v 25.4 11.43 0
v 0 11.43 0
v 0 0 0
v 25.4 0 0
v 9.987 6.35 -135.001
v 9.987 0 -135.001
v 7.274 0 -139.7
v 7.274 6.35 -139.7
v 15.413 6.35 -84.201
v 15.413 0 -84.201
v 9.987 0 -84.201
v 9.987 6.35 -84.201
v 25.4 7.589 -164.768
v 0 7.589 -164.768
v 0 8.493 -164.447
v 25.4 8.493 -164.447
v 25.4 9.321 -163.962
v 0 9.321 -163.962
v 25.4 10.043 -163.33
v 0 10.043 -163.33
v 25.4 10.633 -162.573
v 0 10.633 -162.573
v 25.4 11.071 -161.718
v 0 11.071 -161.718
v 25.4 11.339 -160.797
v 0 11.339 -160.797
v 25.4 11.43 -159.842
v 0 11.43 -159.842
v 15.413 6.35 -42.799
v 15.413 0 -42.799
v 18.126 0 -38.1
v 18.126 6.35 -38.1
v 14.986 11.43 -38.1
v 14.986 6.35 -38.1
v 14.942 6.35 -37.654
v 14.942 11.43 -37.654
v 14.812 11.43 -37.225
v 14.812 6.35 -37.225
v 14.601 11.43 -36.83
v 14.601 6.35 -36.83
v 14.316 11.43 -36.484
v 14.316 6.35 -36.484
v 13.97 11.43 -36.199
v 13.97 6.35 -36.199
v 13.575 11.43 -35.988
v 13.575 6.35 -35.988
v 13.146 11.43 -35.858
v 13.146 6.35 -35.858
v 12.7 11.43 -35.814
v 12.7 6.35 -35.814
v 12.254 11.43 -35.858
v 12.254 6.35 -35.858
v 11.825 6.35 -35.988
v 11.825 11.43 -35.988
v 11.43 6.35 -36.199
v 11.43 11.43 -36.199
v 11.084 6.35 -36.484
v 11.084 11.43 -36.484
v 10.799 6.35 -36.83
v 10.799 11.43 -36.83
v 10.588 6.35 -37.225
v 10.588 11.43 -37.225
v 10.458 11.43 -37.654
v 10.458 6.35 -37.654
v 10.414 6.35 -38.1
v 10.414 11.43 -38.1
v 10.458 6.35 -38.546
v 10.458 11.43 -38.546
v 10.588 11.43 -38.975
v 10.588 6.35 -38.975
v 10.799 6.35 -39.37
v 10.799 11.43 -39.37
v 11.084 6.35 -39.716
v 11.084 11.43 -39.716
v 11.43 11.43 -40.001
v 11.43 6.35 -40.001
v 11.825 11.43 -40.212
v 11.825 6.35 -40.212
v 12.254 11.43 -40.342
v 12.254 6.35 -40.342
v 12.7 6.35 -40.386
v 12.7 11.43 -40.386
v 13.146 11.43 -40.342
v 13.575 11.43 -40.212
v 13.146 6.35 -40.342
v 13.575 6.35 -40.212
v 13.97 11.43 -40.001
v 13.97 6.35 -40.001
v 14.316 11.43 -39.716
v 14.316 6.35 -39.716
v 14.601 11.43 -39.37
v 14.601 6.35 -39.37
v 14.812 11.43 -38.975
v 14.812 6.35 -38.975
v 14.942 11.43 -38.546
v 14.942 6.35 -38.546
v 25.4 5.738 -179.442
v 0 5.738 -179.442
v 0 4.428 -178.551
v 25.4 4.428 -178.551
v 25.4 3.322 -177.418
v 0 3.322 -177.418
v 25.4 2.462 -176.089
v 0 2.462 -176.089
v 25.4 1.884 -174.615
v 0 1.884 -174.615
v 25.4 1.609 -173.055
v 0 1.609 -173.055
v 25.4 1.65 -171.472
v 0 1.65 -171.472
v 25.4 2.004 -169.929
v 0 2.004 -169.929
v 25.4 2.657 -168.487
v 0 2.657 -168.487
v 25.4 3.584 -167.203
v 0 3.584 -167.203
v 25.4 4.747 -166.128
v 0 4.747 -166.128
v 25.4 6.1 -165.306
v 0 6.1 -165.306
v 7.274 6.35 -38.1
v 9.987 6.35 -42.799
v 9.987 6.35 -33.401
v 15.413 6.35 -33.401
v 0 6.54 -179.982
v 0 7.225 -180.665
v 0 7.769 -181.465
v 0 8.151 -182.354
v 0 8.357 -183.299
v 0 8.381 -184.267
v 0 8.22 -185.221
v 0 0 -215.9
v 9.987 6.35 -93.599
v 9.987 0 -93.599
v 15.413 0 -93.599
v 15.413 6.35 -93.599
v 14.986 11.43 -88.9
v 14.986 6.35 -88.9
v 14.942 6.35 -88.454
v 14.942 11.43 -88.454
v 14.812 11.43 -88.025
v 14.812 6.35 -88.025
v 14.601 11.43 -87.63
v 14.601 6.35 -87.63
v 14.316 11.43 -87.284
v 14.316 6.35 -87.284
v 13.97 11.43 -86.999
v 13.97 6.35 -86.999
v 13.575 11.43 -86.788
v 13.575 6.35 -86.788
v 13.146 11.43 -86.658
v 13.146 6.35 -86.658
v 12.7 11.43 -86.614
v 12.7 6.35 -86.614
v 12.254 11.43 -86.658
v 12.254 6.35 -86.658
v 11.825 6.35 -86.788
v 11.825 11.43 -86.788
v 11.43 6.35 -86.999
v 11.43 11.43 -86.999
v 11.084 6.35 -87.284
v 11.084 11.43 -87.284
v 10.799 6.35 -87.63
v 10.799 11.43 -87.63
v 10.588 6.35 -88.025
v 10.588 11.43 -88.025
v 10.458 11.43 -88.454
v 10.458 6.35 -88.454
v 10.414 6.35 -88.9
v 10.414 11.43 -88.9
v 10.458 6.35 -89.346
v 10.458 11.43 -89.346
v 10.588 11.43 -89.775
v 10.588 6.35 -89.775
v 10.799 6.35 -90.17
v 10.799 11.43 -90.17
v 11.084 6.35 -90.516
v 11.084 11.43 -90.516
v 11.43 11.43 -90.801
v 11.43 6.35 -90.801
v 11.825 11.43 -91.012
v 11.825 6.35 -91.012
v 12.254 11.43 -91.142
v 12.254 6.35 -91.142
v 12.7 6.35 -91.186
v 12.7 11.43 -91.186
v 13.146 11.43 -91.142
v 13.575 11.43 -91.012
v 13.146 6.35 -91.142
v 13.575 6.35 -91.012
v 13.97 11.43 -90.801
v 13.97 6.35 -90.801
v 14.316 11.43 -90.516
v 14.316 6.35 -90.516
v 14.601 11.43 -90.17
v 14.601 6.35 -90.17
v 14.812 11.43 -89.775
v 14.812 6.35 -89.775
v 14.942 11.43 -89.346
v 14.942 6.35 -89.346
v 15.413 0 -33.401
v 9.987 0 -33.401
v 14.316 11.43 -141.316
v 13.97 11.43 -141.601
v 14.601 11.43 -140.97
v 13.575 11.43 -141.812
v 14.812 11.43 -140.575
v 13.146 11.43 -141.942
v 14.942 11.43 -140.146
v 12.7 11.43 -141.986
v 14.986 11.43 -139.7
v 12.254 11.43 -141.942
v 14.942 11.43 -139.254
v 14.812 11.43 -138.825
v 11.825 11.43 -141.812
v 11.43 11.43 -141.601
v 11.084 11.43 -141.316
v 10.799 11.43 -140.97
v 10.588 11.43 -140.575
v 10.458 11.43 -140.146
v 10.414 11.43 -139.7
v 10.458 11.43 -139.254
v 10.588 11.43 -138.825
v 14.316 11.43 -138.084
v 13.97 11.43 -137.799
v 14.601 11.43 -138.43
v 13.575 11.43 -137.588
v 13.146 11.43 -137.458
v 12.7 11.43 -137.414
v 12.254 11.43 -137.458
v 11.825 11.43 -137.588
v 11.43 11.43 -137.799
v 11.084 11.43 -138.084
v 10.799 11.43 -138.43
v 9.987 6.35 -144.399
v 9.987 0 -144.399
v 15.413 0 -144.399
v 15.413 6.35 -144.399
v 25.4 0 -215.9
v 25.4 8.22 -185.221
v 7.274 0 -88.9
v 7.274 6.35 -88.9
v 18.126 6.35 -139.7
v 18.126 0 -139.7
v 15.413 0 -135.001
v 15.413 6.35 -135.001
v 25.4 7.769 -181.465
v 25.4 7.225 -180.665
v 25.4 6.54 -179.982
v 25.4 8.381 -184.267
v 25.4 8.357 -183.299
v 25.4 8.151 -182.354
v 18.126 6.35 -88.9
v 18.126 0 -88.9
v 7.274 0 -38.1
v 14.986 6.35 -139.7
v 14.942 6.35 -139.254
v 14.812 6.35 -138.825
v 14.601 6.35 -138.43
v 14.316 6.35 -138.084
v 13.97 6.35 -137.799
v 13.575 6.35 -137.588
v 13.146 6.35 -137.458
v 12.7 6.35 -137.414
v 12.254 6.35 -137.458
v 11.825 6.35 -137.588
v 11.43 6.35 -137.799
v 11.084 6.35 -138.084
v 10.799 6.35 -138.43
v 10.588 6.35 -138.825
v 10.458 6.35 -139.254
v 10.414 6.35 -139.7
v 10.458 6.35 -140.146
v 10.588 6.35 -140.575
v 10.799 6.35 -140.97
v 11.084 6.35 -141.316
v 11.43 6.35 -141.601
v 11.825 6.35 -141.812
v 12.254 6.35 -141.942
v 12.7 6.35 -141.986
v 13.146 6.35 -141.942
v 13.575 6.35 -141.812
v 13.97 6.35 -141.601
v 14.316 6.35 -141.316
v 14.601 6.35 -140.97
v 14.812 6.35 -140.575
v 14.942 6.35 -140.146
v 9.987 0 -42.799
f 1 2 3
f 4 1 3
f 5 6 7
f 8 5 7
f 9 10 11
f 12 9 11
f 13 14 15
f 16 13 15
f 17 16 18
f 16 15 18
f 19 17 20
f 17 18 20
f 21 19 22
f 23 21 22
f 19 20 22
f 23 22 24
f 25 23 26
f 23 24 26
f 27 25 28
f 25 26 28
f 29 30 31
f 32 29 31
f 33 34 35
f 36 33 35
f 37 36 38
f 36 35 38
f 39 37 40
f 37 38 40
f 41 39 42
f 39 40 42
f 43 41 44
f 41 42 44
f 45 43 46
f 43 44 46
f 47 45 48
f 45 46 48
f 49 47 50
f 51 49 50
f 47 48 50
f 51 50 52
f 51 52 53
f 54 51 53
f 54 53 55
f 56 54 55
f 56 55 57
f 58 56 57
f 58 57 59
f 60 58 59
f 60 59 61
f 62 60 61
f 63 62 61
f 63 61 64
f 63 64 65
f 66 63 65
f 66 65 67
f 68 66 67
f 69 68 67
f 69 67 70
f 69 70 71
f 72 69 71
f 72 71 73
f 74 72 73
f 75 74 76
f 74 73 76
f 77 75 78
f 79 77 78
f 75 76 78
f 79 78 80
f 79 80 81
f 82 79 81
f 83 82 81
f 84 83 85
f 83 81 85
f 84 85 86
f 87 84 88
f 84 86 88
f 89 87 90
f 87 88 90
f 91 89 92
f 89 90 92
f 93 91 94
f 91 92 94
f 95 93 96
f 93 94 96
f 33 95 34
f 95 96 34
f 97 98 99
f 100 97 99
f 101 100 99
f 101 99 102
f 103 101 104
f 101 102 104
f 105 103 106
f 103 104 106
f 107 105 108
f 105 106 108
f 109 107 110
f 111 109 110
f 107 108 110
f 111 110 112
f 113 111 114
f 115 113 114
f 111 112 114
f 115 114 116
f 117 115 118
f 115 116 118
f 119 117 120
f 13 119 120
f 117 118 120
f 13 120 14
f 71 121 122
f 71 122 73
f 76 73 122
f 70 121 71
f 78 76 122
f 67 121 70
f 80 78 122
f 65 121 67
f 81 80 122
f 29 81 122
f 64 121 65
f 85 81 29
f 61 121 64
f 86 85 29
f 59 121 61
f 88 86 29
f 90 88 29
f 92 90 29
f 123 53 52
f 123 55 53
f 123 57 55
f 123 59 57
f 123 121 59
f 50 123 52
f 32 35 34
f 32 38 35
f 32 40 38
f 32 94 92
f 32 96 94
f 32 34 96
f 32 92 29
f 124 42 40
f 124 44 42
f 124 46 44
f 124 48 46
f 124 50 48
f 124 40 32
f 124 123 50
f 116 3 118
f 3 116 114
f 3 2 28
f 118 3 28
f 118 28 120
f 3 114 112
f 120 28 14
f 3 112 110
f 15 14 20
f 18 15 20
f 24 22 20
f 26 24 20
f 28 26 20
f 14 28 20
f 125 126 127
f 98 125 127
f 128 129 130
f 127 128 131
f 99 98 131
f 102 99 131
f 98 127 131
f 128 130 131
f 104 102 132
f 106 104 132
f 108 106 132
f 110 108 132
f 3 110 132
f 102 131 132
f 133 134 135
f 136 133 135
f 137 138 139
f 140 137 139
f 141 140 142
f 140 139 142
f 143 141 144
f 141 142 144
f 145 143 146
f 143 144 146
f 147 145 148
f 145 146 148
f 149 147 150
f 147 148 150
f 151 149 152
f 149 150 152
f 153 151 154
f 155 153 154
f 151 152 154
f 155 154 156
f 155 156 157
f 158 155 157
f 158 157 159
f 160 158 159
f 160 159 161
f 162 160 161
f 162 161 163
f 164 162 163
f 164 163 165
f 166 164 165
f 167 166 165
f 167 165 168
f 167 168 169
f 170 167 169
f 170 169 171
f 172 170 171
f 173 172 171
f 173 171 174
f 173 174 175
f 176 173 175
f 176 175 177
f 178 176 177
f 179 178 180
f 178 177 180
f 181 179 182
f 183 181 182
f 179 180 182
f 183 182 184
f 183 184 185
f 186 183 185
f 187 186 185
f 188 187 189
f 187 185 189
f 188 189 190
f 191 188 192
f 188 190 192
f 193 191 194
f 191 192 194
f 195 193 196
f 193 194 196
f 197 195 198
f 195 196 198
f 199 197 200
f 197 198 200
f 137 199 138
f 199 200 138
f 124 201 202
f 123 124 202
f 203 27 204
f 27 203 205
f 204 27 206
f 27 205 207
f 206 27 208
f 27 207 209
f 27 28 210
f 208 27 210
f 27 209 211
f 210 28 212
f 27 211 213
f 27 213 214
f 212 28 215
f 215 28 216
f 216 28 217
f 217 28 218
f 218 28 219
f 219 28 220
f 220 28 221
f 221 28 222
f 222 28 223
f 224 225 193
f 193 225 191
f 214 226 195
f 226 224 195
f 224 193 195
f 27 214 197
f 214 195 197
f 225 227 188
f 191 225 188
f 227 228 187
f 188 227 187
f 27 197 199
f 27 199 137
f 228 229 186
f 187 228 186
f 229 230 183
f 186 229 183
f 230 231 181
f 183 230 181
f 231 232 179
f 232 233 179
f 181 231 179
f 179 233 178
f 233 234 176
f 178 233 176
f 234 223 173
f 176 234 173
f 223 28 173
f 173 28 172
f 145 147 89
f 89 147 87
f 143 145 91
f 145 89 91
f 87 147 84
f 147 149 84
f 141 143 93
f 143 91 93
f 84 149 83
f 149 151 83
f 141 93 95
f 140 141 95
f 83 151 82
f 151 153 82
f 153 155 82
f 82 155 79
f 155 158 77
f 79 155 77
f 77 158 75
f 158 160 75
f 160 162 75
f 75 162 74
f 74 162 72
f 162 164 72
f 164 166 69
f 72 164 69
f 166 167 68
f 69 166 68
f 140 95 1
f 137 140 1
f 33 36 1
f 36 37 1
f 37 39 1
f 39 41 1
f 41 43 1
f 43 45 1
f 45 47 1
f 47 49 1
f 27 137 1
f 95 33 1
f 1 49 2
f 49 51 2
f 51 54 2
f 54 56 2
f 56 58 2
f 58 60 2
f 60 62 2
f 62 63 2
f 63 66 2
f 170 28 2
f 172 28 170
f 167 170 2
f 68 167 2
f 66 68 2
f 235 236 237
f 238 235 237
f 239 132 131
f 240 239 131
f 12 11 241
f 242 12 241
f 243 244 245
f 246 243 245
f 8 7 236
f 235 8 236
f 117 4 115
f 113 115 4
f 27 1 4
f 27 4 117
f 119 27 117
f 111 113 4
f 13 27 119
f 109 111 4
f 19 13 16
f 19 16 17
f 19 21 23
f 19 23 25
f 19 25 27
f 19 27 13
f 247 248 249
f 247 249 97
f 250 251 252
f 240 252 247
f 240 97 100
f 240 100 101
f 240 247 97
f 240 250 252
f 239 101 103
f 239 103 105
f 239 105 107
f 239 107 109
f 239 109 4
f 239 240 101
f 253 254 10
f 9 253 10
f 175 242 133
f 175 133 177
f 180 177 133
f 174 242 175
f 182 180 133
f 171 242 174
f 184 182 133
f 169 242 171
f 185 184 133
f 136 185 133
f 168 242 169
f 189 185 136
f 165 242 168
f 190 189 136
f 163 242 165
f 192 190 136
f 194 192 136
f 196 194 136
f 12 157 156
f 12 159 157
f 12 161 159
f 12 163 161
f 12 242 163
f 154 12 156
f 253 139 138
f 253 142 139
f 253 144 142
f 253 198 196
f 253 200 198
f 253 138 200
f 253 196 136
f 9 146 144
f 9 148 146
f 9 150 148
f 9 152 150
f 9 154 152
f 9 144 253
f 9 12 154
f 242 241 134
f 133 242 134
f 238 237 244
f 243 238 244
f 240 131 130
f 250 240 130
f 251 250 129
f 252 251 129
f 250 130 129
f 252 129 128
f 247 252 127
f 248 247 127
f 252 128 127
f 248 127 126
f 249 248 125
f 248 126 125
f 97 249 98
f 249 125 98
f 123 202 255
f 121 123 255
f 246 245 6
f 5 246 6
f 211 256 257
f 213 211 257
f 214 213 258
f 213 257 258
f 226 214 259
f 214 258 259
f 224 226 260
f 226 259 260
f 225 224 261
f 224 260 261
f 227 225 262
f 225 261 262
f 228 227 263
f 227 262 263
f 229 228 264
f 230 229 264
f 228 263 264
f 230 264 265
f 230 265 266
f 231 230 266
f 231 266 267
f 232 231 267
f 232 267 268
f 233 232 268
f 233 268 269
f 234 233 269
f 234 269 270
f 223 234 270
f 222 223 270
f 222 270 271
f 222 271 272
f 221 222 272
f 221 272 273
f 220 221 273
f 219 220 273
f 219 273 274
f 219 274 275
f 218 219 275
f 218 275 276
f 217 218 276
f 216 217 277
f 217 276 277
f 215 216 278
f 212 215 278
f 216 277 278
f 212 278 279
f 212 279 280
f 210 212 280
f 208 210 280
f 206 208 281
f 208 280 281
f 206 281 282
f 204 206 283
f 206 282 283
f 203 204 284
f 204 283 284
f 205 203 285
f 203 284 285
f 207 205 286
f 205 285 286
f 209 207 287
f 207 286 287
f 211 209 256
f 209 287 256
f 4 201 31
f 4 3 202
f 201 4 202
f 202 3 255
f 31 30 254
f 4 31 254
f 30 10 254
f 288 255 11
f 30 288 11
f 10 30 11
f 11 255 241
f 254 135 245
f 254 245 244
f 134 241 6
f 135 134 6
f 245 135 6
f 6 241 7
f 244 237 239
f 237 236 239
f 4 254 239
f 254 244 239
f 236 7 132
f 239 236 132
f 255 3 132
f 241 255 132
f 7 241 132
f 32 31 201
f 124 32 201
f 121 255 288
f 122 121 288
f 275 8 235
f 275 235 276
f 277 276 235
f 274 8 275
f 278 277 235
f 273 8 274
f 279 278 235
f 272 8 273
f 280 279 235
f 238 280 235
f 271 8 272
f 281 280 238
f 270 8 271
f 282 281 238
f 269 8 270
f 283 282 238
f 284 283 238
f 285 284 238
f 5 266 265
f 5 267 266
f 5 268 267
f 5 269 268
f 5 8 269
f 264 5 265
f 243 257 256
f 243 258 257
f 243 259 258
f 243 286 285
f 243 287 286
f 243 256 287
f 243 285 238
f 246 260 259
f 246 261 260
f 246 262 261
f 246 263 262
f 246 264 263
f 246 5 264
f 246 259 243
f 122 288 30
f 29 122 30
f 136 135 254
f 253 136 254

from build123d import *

# Parameters (mm, degrees)
BOSS_EXTRUDE1_DEPTH = 25.4
SKETCH2_R           = 2.286
CUT_EXTRUDE1_DEPTH  = 12.43
CUT_EXTRUDE2_DEPTH  = 6.35


with BuildPart() as part:
    # Sketch1 → Boss-Extrude1 (new body)
    with BuildSketch(Plane(origin=(0, 0, 0), x_dir=(0, 0, -1), z_dir=(1, 0, 0))):
        with BuildLine():
            Line((0, 0), (215.9, 0))
            Line((215.9, 0), (185.220791685, 8.220469092))
            ThreePointArc((185.220791685, 8.220469092), (181.900696214, 7.98102699), (179.441604229, 5.73754018))
            ThreePointArc((179.441604229, 5.73754018), (171.472327537, 1.649943093), (164.7682143, 7.58902439))
            ThreePointArc((164.7682143, 7.58902439), (162.965103566, 10.356285306), (159.841631451, 11.43))
            Line((159.841631451, 11.43), (0, 11.43))
            Line((0, 11.43), (0, 0))
        make_face()
    extrude(amount=BOSS_EXTRUDE1_DEPTH)

    # Sketch2 → Cut-Extrude1 (cut, through all)
    with BuildSketch(Plane.XZ):
        with Locations((12.7, -139.7)):
            Circle(SKETCH2_R)
        with Locations((12.7, -88.9)):
            Circle(SKETCH2_R)
        with Locations((12.7, -38.1)):
            Circle(SKETCH2_R)
    extrude(amount=-CUT_EXTRUDE1_DEPTH, mode=Mode.SUBTRACT)

    # Sketch3 → Cut-Extrude2 (cut)
    with BuildSketch(Plane.XZ):
        Polygon((18.12593783, -139.7), (15.412968915, -135.001), (9.987031085, -135.001), (7.27406217, -139.7), (9.987031085, -144.399), (15.412968915, -144.399), align=None)
        Polygon((18.12593783, -88.9), (15.412968915, -84.201), (9.987031085, -84.201), (7.27406217, -88.9), (9.987031085, -93.599), (15.412968915, -93.599), align=None)
        Polygon((18.12593783, -38.1), (15.412968915, -33.401), (9.987031085, -33.401), (7.27406217, -38.1), (9.987031085, -42.799), (15.412968915, -42.799), align=None)
    extrude(amount=-CUT_EXTRUDE2_DEPTH, mode=Mode.SUBTRACT)


solid = part.part
